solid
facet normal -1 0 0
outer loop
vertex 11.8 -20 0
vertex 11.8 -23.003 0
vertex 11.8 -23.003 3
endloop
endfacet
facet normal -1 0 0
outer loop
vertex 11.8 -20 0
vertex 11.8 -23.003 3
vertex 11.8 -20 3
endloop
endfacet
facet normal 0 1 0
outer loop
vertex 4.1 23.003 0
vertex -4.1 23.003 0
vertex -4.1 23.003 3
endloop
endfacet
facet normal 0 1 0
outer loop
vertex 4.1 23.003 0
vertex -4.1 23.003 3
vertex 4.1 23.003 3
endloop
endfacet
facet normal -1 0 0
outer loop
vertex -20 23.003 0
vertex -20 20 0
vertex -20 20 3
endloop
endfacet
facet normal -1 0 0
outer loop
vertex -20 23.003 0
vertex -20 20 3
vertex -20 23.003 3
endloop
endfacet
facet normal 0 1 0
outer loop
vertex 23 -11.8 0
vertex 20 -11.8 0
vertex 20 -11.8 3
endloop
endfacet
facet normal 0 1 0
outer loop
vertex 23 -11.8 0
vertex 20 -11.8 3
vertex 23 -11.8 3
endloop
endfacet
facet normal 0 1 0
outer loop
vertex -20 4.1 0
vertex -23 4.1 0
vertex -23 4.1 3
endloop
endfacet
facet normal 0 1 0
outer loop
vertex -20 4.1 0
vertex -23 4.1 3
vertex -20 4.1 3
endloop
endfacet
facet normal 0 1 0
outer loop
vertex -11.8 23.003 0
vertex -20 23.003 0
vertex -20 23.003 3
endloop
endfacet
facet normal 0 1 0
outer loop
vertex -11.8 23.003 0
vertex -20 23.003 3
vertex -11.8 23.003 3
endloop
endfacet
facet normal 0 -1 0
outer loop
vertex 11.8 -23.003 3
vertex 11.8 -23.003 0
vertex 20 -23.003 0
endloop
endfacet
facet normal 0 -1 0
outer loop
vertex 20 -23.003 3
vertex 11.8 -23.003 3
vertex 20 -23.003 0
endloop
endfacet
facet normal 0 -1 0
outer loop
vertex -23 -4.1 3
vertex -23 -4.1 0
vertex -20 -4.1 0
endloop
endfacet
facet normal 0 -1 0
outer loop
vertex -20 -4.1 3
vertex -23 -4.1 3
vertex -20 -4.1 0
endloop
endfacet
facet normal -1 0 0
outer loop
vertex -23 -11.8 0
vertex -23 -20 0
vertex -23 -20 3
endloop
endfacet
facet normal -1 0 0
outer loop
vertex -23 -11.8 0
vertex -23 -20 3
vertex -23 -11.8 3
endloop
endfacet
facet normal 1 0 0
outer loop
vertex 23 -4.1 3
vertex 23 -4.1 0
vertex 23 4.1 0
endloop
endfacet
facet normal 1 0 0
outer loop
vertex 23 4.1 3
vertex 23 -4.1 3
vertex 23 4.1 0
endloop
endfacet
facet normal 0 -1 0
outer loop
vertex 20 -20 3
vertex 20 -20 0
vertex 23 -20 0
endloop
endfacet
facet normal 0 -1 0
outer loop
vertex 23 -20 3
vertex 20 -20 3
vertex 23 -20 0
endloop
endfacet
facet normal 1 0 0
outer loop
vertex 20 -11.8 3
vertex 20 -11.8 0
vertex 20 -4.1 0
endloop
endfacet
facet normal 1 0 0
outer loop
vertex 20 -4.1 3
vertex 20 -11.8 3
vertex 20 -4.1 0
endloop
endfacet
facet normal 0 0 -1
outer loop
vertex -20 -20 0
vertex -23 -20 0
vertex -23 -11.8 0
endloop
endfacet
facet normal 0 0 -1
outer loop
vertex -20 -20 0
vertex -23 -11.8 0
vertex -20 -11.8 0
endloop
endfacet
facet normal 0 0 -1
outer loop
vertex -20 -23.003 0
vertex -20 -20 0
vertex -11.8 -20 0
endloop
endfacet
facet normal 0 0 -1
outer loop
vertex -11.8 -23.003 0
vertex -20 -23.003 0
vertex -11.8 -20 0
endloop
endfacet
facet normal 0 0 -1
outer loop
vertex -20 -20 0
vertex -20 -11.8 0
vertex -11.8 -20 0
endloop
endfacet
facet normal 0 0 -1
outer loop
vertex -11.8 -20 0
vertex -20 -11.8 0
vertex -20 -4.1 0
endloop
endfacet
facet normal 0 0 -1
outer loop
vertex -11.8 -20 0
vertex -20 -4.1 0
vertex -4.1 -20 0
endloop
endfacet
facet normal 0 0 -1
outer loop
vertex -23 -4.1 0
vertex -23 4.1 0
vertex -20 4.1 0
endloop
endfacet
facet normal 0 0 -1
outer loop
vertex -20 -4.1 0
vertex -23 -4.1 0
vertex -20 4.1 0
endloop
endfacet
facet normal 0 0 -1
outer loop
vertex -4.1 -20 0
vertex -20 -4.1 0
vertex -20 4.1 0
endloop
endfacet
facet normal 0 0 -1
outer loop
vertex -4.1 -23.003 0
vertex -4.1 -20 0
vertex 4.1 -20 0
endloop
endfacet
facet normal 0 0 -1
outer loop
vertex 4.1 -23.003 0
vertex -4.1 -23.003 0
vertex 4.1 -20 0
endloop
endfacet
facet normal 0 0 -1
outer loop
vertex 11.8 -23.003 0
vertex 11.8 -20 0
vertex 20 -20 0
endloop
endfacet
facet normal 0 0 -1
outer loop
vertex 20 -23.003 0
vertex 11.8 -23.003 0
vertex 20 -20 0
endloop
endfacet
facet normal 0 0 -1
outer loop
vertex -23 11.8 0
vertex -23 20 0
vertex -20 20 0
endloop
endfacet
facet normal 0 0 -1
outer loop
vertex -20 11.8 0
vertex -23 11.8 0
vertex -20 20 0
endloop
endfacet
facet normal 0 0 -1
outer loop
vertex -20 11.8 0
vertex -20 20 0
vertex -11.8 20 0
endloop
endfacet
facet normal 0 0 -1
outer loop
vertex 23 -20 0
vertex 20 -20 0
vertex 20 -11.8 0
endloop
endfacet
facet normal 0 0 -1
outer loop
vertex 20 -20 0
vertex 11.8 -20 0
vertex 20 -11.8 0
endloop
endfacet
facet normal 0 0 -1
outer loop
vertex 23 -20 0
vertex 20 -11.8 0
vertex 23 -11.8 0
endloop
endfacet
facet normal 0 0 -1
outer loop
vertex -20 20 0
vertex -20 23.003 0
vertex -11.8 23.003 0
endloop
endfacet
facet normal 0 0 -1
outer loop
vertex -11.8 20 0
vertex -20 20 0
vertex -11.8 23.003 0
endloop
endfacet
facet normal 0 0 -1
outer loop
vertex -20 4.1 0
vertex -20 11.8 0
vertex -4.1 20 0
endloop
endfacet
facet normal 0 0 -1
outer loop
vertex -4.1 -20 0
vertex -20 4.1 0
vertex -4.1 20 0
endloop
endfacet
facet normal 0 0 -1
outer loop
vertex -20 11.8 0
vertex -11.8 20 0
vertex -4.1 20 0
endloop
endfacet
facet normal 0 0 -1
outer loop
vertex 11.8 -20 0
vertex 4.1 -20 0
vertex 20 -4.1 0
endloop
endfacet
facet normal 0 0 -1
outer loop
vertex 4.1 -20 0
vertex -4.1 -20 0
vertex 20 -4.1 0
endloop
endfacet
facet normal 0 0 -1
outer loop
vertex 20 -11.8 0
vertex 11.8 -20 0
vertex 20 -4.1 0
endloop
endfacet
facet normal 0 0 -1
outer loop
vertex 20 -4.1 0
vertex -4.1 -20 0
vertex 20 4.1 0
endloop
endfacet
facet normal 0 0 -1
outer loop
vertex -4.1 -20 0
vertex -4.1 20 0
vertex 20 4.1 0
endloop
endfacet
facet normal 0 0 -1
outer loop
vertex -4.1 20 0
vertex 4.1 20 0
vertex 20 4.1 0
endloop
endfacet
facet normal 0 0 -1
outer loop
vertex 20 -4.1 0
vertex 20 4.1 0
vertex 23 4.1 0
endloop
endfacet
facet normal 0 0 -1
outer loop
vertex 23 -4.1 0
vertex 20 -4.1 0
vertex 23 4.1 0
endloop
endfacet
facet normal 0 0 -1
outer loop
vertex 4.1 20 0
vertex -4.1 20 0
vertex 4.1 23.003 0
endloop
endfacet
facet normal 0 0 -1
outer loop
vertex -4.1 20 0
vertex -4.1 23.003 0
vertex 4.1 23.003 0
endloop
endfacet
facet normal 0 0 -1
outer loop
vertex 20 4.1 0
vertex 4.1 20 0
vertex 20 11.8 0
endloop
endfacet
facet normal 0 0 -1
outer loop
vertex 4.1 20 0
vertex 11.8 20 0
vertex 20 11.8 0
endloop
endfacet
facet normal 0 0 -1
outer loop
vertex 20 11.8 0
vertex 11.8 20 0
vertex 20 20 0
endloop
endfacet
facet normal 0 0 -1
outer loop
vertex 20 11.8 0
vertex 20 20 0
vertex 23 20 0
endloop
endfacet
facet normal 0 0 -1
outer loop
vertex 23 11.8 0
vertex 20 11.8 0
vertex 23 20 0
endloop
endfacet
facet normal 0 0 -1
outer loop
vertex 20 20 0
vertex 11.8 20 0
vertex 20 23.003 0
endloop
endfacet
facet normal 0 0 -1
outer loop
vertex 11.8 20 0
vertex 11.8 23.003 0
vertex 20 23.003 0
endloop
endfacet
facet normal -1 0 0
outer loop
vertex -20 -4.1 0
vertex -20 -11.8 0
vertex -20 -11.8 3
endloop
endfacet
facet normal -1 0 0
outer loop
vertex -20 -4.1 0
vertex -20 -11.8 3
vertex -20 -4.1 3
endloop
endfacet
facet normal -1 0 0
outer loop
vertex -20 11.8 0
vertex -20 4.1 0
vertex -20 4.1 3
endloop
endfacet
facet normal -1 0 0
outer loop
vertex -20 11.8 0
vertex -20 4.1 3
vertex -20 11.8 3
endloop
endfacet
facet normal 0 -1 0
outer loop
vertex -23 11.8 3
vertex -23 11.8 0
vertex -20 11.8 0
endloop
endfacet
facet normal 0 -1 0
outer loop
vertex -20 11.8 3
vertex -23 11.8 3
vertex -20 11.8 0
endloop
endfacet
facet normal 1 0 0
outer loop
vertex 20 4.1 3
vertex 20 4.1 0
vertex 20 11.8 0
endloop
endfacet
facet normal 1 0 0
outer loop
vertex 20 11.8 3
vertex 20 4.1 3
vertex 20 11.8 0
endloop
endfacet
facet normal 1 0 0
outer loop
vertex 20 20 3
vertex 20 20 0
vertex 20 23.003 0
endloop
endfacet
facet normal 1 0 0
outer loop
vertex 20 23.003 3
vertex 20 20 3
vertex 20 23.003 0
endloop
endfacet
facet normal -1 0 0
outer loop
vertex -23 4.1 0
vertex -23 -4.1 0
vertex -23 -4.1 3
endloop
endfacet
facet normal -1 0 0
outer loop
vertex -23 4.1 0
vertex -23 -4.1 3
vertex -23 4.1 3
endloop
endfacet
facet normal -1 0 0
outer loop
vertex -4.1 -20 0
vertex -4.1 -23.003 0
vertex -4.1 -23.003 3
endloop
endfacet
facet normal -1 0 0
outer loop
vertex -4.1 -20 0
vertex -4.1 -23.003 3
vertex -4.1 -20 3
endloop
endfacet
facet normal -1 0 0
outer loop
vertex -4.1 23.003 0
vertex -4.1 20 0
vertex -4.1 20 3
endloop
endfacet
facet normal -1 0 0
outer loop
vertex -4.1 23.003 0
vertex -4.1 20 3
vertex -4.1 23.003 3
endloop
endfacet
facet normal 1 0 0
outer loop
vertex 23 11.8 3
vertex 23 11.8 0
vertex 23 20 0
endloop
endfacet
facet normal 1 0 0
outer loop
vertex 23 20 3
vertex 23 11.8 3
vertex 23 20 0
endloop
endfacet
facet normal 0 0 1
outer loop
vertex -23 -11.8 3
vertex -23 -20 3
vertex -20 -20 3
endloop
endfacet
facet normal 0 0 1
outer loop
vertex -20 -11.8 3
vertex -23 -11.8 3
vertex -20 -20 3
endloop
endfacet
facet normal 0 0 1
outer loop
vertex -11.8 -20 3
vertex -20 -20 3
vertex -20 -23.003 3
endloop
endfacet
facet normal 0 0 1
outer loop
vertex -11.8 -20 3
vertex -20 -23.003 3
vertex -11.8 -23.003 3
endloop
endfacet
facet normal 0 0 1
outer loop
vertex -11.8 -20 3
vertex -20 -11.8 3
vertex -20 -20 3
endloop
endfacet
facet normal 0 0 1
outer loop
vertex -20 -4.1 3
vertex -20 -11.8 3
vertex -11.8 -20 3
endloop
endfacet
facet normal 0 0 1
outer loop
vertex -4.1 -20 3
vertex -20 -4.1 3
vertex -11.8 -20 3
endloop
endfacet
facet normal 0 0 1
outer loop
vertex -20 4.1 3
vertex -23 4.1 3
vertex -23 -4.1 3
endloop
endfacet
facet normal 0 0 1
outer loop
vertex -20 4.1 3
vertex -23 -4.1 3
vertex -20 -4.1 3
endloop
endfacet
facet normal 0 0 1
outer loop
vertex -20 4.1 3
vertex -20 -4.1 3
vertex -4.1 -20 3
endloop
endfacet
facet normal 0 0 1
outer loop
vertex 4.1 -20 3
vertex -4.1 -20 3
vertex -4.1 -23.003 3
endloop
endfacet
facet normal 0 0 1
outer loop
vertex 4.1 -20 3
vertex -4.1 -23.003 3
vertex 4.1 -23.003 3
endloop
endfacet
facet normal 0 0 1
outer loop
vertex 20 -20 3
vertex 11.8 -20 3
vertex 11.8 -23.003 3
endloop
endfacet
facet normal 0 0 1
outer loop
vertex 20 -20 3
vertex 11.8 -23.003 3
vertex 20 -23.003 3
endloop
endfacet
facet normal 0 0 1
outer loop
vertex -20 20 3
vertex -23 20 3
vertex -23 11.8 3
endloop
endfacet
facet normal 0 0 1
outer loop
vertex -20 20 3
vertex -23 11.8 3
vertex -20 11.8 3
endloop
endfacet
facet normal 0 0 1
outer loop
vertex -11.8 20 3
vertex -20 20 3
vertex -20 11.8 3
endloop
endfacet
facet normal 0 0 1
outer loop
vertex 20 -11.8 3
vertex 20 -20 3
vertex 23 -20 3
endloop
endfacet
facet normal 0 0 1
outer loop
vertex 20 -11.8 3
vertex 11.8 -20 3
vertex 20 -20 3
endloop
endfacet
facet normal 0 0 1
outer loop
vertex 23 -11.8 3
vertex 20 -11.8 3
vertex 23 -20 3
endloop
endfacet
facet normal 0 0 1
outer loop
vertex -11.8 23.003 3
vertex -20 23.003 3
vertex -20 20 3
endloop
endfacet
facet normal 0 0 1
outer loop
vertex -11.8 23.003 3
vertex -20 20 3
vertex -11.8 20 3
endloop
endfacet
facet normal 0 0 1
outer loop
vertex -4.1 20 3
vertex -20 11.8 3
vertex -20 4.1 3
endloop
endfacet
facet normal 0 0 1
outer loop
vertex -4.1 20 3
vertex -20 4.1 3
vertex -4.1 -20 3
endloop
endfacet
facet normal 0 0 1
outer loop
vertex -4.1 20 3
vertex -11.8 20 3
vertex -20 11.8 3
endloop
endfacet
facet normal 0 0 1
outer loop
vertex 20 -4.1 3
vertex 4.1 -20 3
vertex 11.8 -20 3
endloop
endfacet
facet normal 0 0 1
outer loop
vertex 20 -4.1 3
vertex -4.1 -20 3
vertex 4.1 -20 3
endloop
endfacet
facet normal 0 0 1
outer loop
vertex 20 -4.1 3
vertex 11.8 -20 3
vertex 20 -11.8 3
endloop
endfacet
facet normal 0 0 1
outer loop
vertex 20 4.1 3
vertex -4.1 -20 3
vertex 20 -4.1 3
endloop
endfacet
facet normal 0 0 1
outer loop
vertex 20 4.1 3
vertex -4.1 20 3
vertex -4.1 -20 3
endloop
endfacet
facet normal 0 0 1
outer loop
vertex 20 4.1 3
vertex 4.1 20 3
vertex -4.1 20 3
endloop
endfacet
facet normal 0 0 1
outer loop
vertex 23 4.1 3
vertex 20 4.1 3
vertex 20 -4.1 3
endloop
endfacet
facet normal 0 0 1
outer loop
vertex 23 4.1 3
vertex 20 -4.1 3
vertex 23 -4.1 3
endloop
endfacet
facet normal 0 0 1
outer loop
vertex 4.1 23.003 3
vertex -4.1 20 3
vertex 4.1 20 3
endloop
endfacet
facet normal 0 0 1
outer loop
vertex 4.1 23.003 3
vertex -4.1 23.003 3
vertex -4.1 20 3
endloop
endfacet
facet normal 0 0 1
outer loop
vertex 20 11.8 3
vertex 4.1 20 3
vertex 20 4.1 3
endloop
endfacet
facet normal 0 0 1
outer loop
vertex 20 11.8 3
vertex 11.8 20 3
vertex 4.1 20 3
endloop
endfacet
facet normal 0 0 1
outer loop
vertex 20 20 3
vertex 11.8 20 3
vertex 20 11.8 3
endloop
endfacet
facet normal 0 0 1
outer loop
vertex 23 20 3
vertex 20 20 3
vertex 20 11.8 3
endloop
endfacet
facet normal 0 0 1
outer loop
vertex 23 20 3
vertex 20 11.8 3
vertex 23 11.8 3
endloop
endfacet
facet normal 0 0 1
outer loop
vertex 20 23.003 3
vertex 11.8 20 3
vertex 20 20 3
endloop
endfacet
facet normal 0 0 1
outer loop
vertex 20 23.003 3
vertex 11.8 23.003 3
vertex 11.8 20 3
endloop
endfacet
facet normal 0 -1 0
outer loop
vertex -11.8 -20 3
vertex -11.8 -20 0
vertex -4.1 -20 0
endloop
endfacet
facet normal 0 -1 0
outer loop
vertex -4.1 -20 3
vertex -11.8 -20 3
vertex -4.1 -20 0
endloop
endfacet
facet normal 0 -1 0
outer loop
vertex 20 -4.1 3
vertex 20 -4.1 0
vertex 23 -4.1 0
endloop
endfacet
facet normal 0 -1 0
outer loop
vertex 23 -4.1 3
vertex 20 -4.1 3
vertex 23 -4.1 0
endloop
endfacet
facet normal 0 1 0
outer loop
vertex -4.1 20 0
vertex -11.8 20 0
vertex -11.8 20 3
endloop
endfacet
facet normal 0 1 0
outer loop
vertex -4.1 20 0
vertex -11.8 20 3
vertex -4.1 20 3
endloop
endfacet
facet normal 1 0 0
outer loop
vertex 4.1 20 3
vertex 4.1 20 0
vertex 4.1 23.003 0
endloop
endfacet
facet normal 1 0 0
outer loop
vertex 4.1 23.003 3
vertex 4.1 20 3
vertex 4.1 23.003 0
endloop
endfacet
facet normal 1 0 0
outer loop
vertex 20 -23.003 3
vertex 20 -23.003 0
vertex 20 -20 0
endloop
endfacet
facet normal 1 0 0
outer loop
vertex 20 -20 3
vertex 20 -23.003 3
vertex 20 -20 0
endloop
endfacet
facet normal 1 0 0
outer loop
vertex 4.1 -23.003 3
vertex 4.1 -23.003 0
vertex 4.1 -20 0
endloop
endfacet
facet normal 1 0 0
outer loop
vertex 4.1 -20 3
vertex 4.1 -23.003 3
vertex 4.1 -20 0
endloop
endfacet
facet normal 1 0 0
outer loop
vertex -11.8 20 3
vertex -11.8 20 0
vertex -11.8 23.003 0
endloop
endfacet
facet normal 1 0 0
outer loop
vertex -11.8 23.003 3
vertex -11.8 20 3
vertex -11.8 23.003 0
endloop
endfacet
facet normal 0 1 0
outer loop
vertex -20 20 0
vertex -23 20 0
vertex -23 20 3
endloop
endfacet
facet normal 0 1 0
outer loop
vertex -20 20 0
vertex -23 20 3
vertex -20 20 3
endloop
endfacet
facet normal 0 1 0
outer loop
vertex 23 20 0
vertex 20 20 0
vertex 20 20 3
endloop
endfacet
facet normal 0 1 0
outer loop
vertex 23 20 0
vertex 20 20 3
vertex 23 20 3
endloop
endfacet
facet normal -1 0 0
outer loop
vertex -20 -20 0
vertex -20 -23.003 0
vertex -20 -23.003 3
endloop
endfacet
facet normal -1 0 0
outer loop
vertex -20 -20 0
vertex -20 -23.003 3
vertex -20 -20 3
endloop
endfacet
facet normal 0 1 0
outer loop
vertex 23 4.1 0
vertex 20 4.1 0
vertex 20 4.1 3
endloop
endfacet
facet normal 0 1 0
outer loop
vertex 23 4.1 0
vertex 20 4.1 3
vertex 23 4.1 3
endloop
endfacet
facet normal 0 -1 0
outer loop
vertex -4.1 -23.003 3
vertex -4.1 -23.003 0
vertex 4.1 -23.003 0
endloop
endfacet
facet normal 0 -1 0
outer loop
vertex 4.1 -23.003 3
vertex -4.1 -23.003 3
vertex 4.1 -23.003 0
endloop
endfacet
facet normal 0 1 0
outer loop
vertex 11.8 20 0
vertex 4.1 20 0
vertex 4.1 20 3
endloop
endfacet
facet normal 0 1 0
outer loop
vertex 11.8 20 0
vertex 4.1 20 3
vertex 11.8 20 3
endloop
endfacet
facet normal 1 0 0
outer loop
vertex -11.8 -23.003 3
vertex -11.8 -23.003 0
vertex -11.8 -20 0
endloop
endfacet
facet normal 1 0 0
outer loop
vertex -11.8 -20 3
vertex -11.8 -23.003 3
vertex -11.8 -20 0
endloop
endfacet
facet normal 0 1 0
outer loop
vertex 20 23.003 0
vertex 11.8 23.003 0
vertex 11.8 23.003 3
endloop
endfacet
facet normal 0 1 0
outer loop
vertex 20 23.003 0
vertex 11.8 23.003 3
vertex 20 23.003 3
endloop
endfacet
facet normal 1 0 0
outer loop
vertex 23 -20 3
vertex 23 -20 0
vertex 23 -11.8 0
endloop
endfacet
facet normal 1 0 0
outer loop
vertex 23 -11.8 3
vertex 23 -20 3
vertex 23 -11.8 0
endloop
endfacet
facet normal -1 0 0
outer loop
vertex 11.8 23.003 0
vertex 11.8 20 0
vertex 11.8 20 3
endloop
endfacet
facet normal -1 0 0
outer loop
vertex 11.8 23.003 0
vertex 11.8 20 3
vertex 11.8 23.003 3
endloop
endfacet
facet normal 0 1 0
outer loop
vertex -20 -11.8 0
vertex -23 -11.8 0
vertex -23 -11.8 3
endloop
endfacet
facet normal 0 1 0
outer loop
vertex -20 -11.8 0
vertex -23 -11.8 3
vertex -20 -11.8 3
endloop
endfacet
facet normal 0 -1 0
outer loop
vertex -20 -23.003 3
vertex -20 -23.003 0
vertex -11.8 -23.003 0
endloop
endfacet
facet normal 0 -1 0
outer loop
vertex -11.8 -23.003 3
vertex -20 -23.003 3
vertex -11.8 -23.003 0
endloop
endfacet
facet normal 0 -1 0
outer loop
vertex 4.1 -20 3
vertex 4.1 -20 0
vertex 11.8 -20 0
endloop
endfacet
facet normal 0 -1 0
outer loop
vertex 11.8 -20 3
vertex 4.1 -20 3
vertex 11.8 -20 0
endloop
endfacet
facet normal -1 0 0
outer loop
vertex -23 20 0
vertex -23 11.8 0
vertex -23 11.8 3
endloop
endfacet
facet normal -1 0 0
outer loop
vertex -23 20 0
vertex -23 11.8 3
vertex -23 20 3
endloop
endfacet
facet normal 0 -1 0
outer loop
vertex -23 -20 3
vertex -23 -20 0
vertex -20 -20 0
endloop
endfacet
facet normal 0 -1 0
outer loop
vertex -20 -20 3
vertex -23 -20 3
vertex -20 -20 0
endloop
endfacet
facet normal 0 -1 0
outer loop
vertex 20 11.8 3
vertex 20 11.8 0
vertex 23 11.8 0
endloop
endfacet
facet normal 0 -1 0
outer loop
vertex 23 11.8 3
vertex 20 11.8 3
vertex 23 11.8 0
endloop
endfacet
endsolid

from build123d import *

# Parameters (mm, degrees)
CROQUIS1_W              = 3
CROQUIS1_H              = 8.2
CROQUIS1_W_2            = 8.2
CROQUIS1_H_2            = 3.00257915
CROQUIS1_W_3            = 40
CROQUIS1_H_3            = 40
SALIENTE_EXTRUIR1_DEPTH = 3


with BuildPart() as part:
    # Croquis1 → Saliente-Extruir1 (new body)
    with BuildSketch(Plane.XY):
        with Locations((-21.5, 15.9)):
            Rectangle(CROQUIS1_W, CROQUIS1_H)
        with Locations((-15.9, 21.501289575)):
            Rectangle(CROQUIS1_W_2, CROQUIS1_H_2)
        with Locations((0, 21.501289575)):
            Rectangle(CROQUIS1_W_2, CROQUIS1_H_2)
        with Locations((15.9, 21.501289575)):
            Rectangle(CROQUIS1_W_2, CROQUIS1_H_2)
        Rectangle(CROQUIS1_W_3, CROQUIS1_H_3)
        with Locations((21.5, 0)):
            Rectangle(CROQUIS1_W, CROQUIS1_H)
        with Locations((-21.5, 0)):
            Rectangle(CROQUIS1_W, CROQUIS1_H)
        with Locations((-21.5, -15.9)):
            Rectangle(CROQUIS1_W, CROQUIS1_H)
        with Locations((-15.9, -21.501289575)):
            Rectangle(CROQUIS1_W_2, CROQUIS1_H_2)
        with Locations((0, -21.501289575)):
            Rectangle(CROQUIS1_W_2, CROQUIS1_H_2)
        with Locations((15.9, -21.501289575)):
            Rectangle(CROQUIS1_W_2, CROQUIS1_H_2)
        with Locations((21.5, -15.9)):
            Rectangle(CROQUIS1_W, CROQUIS1_H)
        with Locations((21.5, 15.9)):
            Rectangle(CROQUIS1_W, CROQUIS1_H)
    extrude(amount=SALIENTE_EXTRUIR1_DEPTH)


solid = part.part
